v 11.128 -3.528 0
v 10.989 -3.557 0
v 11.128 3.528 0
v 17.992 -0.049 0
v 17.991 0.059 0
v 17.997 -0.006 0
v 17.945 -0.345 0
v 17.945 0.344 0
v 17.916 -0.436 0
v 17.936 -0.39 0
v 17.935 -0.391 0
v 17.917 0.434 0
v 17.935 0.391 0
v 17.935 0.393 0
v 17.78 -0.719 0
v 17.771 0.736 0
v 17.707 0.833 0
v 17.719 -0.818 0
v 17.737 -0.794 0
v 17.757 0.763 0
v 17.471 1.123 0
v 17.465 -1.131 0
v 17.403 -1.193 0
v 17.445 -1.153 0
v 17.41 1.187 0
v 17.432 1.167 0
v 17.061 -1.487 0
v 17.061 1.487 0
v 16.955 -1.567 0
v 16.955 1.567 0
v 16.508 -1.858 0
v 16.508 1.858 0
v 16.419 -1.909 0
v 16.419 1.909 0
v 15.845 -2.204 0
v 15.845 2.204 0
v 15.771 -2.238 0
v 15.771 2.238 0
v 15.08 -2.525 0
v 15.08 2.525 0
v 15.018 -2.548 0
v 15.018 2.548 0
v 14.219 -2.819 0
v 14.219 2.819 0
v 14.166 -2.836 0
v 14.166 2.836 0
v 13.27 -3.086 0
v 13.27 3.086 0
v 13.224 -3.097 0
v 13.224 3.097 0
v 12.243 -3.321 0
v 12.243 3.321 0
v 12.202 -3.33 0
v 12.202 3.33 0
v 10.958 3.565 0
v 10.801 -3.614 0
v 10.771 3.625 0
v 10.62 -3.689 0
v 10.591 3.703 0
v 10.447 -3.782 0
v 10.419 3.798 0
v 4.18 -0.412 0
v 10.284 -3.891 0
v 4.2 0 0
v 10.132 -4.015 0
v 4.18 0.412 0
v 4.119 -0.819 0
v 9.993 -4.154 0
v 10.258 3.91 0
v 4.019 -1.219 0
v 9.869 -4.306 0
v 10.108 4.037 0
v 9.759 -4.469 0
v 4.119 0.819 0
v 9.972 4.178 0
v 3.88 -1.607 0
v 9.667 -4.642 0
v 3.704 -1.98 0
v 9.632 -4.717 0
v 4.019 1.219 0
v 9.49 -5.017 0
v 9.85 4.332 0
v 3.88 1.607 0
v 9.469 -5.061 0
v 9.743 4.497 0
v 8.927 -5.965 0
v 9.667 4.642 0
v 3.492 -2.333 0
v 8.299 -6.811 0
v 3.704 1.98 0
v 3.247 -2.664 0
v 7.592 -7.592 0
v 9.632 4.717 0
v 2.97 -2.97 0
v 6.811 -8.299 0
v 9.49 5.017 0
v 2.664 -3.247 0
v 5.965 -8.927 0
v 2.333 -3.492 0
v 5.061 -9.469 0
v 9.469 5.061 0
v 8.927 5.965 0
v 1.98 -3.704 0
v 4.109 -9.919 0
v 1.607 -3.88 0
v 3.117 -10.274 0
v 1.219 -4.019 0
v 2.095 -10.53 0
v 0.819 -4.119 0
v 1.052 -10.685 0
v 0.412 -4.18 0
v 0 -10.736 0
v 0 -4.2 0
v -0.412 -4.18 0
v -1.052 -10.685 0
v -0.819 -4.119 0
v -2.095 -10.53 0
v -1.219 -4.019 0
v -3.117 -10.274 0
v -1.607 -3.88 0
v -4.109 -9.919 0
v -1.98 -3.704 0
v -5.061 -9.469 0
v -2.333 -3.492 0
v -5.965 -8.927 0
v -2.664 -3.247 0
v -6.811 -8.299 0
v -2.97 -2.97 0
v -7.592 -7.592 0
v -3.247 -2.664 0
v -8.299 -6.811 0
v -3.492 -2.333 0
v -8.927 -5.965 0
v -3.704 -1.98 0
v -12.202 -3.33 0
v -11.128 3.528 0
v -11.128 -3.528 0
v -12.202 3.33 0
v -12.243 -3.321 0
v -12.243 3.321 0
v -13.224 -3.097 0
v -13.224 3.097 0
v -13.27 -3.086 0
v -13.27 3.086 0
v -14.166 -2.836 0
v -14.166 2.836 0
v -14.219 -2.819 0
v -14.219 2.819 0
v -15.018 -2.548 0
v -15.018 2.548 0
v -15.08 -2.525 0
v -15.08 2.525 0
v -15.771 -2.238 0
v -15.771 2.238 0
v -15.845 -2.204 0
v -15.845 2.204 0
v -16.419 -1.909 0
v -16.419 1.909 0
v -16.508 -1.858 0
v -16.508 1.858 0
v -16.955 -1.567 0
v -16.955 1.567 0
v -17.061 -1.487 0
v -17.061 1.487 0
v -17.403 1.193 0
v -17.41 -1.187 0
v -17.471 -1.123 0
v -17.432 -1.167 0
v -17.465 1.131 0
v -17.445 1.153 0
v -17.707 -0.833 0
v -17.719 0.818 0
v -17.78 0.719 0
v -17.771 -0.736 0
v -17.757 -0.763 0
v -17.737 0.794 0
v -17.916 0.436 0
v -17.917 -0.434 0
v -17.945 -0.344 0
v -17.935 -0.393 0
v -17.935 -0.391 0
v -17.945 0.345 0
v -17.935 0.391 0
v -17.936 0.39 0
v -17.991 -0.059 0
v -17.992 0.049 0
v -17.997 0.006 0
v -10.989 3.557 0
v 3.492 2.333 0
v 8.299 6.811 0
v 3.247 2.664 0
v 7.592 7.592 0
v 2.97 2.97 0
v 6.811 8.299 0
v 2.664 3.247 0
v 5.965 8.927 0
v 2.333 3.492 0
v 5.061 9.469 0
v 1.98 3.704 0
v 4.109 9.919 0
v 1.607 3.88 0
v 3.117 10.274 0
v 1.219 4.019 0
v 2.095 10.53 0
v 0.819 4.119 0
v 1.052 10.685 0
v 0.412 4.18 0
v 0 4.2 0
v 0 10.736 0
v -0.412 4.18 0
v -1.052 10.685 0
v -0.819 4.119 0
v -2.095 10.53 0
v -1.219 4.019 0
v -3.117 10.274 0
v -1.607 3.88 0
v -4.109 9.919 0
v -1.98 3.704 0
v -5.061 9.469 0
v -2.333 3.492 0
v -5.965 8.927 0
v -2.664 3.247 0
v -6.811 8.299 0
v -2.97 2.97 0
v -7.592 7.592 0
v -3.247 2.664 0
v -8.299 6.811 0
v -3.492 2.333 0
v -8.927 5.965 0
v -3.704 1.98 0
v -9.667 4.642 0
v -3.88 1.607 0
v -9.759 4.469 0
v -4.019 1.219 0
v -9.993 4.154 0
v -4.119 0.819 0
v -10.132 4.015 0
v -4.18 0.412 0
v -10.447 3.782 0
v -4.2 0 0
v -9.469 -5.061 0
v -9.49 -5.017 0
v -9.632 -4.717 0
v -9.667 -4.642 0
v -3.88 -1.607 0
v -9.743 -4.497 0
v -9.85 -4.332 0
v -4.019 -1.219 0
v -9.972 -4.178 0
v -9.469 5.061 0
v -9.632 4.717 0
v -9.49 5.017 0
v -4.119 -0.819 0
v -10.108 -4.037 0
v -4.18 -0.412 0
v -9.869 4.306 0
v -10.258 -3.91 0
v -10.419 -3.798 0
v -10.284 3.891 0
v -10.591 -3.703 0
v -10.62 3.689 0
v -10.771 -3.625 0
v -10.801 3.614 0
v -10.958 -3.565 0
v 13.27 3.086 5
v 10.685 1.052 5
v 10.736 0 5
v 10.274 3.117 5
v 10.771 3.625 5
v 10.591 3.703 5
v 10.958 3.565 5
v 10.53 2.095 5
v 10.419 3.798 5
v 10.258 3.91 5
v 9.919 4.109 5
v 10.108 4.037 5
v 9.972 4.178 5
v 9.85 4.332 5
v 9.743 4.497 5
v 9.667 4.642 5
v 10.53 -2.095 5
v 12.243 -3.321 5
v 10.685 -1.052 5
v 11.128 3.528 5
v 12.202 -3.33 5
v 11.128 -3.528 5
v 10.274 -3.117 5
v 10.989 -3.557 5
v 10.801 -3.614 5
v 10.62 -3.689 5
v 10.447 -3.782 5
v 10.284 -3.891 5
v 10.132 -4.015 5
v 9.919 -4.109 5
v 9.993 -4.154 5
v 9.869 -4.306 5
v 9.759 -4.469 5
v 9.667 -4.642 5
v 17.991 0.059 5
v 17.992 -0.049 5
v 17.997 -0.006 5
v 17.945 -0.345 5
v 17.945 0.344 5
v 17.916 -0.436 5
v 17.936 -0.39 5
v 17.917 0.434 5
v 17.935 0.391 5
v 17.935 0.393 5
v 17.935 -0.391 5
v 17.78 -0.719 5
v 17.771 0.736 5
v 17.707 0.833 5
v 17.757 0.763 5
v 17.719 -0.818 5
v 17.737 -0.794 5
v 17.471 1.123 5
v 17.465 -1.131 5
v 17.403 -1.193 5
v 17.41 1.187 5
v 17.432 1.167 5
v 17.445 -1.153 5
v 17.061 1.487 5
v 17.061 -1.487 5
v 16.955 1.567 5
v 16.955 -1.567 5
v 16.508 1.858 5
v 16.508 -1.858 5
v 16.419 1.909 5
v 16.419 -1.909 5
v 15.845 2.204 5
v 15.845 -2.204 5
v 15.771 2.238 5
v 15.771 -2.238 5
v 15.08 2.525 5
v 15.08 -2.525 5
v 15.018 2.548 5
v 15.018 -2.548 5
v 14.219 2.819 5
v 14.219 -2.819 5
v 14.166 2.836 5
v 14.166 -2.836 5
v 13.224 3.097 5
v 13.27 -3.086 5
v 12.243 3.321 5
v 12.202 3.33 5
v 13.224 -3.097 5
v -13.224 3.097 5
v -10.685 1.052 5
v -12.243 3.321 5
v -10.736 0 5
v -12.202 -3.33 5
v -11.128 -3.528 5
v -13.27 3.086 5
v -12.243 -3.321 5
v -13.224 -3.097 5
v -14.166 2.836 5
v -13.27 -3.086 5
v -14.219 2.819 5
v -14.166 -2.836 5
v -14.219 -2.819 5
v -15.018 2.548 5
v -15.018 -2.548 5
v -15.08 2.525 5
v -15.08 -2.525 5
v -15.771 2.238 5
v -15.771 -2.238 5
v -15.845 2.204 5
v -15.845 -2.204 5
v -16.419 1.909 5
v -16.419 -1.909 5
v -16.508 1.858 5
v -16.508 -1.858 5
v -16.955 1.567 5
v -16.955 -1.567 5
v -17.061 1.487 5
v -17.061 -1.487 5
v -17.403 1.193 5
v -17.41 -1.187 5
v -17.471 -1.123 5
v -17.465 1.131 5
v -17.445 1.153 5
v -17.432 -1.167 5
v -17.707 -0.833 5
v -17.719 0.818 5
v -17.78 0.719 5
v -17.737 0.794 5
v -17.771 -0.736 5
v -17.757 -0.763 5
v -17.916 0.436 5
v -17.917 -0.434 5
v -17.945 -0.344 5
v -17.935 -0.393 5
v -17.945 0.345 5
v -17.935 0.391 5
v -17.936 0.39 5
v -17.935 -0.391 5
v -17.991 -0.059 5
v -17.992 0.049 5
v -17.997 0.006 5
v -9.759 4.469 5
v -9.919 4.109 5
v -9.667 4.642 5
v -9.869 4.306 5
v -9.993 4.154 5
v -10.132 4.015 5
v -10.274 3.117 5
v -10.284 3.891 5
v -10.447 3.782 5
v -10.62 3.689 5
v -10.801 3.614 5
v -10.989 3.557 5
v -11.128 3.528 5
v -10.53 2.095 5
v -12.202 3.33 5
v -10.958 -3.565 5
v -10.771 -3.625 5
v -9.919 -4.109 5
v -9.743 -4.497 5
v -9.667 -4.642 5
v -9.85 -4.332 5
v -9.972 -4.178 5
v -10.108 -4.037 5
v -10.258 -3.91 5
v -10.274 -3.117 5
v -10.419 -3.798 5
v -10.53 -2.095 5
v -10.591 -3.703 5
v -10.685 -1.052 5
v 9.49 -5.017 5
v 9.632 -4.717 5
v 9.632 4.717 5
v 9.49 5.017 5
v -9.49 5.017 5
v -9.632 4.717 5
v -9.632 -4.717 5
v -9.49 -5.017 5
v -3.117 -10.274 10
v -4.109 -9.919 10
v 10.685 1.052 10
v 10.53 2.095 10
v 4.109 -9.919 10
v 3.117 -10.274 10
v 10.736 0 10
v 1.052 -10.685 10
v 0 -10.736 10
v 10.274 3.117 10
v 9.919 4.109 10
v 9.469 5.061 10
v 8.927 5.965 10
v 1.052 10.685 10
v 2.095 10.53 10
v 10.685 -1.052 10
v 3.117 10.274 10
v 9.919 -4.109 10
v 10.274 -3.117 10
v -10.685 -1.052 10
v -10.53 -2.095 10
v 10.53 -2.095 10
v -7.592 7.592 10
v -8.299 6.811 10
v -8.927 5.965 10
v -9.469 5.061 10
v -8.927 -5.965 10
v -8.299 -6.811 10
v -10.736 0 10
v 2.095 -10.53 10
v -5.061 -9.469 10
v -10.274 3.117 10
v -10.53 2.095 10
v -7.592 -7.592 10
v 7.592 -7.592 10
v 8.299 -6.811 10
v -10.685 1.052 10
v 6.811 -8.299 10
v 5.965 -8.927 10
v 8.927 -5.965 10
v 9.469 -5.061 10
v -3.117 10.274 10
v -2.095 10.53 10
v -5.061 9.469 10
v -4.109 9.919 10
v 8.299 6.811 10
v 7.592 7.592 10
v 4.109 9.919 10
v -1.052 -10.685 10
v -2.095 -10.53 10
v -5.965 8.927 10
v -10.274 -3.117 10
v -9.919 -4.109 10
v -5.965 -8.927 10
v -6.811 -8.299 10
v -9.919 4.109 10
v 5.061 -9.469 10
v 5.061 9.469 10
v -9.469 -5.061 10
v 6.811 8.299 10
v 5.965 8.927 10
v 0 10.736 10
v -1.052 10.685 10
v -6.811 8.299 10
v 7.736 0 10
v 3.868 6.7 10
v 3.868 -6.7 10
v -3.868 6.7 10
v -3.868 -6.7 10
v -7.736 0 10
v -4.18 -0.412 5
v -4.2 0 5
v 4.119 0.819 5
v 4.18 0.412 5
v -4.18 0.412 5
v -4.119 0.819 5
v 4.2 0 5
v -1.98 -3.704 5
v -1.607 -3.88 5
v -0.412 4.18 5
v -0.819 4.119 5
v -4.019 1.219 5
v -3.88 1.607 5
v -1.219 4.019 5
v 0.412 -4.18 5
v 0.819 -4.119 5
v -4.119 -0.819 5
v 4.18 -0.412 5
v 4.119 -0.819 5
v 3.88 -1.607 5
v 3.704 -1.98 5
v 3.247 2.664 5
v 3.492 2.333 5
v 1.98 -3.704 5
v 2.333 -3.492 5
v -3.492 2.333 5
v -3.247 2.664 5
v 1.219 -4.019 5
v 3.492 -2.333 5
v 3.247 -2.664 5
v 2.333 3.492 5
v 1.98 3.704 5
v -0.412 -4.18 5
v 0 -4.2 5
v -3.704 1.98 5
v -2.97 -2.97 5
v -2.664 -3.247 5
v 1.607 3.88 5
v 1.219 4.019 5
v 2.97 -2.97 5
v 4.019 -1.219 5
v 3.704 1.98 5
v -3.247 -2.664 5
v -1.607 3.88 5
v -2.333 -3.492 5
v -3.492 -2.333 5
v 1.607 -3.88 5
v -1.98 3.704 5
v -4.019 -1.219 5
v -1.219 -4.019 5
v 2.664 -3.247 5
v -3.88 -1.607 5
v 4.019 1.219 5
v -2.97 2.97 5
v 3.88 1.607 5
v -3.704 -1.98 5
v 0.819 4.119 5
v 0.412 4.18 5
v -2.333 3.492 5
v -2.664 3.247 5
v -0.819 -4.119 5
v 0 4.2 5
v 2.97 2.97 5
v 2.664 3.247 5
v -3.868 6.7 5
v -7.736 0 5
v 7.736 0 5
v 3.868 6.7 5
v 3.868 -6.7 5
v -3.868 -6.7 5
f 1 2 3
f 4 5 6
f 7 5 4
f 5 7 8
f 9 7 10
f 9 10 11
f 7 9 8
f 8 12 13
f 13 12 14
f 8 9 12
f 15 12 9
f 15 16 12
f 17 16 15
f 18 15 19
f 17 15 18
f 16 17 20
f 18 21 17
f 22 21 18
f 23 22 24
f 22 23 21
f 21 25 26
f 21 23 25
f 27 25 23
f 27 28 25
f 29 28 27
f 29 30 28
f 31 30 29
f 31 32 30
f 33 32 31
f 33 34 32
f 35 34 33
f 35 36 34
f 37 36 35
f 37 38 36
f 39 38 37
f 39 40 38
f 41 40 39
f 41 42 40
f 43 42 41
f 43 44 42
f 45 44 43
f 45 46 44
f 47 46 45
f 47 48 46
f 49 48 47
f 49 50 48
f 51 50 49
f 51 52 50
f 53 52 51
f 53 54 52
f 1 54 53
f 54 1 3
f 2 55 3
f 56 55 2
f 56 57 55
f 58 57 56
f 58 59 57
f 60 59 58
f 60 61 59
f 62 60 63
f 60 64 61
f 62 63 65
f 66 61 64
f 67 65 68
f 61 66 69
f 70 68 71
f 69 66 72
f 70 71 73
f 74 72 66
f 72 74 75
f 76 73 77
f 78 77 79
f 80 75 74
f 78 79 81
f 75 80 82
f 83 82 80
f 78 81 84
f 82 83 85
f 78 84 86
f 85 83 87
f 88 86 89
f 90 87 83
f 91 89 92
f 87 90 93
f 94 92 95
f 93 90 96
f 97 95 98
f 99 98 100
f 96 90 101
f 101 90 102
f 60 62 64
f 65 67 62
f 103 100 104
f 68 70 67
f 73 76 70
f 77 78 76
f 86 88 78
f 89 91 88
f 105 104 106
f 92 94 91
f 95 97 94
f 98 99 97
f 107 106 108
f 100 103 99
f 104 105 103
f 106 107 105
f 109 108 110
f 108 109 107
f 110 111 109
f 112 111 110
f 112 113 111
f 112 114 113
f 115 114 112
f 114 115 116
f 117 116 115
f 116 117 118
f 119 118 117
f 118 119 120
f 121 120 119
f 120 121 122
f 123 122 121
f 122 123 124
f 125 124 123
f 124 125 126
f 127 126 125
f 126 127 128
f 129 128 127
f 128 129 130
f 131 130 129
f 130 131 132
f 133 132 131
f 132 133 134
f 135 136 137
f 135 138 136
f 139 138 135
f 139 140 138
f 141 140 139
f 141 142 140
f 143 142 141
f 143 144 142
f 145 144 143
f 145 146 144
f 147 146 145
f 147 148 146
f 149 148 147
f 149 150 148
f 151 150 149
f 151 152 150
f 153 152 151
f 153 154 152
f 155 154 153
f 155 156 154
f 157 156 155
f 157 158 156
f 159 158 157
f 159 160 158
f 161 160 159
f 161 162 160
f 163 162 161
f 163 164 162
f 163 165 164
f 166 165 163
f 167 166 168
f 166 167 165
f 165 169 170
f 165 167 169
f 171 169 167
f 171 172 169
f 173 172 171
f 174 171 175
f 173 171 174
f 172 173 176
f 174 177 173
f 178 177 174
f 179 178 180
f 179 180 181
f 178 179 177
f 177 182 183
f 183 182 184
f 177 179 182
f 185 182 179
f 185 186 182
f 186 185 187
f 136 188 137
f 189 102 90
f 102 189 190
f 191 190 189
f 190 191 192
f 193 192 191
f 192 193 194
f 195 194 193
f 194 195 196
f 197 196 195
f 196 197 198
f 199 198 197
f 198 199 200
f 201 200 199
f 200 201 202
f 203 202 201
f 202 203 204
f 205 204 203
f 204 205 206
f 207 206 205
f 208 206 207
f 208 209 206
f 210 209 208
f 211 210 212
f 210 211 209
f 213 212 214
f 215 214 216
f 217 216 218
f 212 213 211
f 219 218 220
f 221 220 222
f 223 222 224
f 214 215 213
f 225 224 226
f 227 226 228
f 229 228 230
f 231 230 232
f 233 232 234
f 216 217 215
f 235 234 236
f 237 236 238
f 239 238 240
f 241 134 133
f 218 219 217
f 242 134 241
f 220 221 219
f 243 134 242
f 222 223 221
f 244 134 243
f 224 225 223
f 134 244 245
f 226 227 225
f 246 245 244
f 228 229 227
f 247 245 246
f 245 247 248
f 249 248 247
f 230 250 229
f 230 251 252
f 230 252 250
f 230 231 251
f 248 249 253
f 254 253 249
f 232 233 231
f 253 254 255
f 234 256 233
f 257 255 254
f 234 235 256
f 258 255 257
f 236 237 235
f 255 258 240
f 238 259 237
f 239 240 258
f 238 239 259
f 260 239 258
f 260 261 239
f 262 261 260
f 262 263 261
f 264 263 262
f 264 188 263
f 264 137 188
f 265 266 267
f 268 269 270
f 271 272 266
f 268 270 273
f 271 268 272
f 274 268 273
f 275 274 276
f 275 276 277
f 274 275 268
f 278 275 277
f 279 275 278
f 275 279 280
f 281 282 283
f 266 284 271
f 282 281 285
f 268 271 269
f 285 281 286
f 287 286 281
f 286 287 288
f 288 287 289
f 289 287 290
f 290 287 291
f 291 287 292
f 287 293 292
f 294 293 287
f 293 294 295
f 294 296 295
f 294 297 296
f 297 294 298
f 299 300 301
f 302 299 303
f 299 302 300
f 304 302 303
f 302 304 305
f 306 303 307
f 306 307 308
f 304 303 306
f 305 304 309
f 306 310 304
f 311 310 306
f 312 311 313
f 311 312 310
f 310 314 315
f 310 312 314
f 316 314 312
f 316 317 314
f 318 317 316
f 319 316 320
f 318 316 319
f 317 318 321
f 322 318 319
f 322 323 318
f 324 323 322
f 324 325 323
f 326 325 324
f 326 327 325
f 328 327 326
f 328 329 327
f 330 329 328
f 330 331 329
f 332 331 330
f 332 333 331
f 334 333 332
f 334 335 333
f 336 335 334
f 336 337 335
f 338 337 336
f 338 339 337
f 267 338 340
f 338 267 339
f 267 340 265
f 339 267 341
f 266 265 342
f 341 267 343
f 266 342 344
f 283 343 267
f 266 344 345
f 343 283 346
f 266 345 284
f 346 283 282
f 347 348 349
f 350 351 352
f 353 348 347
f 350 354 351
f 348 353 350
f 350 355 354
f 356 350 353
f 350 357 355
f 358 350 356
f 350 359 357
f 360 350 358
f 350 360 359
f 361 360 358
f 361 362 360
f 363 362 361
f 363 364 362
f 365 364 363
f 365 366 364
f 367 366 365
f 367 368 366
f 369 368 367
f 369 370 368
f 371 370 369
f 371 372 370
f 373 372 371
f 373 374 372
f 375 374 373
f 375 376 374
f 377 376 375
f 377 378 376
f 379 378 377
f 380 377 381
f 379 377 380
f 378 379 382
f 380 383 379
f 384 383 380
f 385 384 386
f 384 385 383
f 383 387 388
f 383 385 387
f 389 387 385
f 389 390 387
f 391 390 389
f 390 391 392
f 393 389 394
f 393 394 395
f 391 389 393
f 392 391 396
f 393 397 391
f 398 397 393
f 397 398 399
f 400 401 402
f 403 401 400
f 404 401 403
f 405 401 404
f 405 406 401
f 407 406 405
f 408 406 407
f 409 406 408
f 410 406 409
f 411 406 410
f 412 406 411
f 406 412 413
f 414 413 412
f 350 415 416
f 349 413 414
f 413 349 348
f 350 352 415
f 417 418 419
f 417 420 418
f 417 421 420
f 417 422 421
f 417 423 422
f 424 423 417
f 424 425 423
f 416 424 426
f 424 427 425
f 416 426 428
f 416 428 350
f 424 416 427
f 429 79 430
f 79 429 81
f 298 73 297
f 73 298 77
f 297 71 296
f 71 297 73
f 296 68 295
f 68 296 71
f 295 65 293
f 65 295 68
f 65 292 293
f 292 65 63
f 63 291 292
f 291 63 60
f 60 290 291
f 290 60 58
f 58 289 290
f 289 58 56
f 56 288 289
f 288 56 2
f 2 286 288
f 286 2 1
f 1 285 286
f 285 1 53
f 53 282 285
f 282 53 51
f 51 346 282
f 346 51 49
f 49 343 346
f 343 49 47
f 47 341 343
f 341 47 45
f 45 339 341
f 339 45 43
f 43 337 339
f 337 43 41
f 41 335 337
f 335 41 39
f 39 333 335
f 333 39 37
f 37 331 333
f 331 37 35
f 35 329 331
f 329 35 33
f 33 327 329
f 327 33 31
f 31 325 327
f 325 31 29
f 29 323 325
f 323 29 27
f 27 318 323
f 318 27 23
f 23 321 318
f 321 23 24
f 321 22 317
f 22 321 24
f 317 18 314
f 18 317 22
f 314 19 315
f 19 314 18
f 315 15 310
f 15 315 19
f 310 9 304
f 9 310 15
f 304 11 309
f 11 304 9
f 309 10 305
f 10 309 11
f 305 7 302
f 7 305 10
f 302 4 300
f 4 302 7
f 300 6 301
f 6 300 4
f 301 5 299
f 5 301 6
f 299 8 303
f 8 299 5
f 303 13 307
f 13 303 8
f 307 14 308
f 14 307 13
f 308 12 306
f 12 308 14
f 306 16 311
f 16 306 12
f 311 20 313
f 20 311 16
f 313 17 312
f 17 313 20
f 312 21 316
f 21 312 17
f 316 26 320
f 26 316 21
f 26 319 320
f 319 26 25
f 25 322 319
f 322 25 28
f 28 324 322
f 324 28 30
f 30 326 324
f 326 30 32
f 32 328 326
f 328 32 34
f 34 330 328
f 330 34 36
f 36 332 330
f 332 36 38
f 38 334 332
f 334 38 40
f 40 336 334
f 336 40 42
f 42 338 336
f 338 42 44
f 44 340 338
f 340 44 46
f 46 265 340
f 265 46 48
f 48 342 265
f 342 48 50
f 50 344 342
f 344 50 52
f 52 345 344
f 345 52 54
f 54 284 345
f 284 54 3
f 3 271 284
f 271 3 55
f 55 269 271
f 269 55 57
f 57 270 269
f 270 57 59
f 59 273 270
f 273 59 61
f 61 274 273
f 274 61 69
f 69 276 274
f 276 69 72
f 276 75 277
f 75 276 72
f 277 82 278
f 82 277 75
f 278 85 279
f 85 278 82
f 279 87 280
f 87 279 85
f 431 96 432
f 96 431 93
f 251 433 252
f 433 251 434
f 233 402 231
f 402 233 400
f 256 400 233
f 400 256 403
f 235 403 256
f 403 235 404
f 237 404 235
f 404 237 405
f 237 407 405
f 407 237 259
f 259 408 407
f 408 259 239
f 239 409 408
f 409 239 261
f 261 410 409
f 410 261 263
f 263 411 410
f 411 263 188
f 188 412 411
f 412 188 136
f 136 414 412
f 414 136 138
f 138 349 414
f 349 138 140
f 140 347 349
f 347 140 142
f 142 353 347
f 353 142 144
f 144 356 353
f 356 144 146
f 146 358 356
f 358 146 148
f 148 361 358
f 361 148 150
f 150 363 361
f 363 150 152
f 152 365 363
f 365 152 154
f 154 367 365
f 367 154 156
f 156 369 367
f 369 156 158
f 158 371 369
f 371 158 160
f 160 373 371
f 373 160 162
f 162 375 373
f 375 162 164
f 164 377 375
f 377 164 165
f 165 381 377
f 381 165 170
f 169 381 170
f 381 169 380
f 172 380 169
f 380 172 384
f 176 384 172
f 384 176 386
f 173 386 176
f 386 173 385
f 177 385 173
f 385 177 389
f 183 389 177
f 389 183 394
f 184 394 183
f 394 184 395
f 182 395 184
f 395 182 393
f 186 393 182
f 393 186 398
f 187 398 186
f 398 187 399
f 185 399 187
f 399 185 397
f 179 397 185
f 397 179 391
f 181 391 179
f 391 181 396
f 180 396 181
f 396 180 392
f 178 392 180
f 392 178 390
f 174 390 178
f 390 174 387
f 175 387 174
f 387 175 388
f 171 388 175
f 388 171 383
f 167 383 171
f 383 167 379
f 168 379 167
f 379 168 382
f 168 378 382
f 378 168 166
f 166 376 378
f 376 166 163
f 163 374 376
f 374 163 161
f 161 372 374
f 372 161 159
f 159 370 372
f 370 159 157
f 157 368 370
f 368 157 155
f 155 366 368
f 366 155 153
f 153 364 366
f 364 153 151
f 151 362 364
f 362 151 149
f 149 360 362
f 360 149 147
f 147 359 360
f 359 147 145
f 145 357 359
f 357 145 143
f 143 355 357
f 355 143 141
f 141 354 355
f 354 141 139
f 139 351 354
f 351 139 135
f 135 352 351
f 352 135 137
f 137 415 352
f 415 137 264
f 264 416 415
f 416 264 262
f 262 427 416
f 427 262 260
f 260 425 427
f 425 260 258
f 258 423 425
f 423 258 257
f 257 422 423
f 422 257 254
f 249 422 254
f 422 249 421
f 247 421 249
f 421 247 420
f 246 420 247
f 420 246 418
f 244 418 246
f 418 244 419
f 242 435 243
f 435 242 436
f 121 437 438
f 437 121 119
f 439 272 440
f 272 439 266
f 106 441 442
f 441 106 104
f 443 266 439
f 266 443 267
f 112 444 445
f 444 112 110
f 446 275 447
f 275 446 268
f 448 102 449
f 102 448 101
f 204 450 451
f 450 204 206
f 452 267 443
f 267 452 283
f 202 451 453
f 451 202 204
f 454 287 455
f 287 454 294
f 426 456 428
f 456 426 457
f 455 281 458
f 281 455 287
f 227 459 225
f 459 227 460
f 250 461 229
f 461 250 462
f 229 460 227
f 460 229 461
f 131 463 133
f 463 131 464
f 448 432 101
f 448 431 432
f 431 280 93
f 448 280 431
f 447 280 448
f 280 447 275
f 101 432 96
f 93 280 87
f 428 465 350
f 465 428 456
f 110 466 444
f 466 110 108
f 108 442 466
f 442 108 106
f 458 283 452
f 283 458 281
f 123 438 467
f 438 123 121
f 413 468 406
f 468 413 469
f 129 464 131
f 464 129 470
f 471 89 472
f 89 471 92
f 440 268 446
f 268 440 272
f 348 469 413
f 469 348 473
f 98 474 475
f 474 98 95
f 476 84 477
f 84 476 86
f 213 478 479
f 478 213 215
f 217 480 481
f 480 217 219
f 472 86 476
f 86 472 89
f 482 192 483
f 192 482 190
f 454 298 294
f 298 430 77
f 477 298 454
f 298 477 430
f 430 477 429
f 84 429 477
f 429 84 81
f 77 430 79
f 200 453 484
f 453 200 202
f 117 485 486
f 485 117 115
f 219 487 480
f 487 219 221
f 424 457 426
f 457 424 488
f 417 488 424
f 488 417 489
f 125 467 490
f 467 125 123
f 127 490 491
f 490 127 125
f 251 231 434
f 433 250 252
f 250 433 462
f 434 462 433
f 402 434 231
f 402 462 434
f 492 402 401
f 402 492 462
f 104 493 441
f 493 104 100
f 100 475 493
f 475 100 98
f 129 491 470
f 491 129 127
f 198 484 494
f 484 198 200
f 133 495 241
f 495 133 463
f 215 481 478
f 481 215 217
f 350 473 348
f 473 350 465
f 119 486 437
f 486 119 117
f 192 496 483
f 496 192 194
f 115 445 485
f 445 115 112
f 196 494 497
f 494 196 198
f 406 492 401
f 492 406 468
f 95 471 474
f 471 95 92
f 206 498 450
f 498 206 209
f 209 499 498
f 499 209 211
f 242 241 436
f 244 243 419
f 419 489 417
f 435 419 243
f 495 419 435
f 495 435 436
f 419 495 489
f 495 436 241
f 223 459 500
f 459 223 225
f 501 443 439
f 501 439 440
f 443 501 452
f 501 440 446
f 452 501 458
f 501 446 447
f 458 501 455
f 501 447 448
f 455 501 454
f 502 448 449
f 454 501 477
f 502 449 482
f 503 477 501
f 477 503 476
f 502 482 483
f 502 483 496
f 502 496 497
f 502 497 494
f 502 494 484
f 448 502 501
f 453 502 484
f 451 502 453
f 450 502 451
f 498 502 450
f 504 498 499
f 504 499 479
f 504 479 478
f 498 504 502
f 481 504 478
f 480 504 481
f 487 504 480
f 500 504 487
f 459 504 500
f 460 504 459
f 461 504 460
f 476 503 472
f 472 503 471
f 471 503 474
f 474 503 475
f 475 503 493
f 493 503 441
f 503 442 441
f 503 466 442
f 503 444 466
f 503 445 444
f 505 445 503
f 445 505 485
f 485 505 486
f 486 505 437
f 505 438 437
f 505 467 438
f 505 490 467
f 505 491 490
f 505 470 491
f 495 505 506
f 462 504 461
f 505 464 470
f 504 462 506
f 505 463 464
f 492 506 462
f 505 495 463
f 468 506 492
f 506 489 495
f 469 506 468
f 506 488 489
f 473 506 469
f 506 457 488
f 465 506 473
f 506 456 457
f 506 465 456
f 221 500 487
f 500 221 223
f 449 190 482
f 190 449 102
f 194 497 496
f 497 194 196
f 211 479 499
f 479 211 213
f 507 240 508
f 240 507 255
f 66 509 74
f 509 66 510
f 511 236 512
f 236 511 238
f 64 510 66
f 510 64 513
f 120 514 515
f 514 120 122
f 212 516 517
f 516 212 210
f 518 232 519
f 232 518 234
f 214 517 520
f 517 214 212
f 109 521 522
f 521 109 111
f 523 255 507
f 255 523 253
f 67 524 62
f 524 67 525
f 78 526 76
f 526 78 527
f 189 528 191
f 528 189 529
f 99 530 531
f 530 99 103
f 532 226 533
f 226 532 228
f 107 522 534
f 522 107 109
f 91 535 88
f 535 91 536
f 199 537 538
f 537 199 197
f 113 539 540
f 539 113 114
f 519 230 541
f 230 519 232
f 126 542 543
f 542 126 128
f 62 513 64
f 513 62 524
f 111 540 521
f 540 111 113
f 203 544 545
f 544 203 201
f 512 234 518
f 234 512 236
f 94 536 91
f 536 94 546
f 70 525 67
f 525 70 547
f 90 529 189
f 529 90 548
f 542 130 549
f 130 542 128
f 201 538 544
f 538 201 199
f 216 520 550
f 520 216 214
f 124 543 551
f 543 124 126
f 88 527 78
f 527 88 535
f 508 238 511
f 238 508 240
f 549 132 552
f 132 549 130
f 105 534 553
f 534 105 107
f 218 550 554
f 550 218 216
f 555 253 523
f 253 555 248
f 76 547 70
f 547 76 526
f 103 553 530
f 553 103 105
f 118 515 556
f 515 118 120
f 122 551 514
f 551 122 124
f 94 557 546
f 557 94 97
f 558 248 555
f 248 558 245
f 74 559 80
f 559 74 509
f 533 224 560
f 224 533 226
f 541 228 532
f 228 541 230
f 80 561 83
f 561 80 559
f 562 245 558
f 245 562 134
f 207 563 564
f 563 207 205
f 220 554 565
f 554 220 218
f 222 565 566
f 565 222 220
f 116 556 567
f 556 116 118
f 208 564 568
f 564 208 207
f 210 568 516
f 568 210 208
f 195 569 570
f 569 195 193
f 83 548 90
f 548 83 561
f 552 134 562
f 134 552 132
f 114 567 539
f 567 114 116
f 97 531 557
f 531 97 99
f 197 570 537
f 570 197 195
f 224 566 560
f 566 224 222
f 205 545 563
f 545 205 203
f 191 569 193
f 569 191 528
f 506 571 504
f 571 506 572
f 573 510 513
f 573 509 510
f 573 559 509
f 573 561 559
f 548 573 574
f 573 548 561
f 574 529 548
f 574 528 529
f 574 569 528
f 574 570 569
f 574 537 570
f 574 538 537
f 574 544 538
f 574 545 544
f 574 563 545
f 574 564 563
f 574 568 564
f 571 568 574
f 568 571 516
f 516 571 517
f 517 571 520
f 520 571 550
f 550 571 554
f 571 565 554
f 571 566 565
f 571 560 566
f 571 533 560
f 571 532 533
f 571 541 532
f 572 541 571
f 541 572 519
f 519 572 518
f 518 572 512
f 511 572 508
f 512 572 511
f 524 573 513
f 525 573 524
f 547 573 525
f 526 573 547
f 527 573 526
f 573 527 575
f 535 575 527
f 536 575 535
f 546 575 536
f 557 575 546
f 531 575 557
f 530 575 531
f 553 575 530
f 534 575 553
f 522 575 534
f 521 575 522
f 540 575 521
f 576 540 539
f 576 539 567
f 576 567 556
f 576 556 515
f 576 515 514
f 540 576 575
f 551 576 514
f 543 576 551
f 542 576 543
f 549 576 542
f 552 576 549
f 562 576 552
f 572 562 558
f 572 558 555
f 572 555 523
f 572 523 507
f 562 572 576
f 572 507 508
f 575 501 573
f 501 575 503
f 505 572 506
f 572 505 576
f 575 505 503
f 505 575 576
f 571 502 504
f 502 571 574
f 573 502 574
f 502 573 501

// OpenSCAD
// file: ../../modules/bolts.scad
module nut_trap(d, h, center = true) {
  linear_extrude(height = h, center = center)
  circle(d = d / cos(30), $fn = 6);
}

module bolt_hole(d, h, center = true) {
  linear_extrude(height = h, center = center)
  circle(d = d, $fn = 64);
}

// Hex holes for self-tapping (nominal - 0.2mm)
module hex_hole(flat_d, h) {
  linear_extrude(height = h, center = true)
  circle(d = flat_d / cos(30), $fn = 6);
}

module m3_bolt_hexhole(h) {
  rotate([0, 0, 90]) hex_hole(flat_d = 2.8, h = h);
}

module m4_bolt_hexhole(h) {
  rotate([0, 0, 90]) hex_hole(flat_d = 3.8, h = h);
}

module m6_bolt_hexhole(h) {
  rotate([0, 0, 90]) hex_hole(flat_d = 5.8, h = h);
}

module m8_bolt_hexhole(h) {
  rotate([0, 0, 90]) hex_hole(flat_d = 7.8, h = h);
}

// M3
module m3_bolt_hole(h, center = false) { bolt_hole(d = 3.4, h = h, center = center); }
module m3_nut_trap(h, center = false) { nut_trap(d = 5.7, h = h, center = center); }

// M4
module m4_bolt_hole(h, center = false) { bolt_hole(d = 4.4, h = h, center = center); }
module m4_nut_trap(h, center = false) { nut_trap(d = 7.5, h = h, center = center); }

// M6
module m6_bolt_hole(h, center = false) { bolt_hole(d = 6.2, h = h, center = center); }
module m6_nut_trap(h, center = false) { nut_trap(d = 10.2, h = h, center = center); }

// M8
module m8_bolt_hole(h, center = false) { bolt_hole(d = 8.4, h = h, center = center); }
module m8_nut_trap(h, center = false) { nut_trap(d = 13.3, h = h, center = center); }
// main file
use <../../modules/bolts.scad>

// 簡易クランプ (コの字のステンレス板・「外六角20mm」) に1本だけ刺さっている
// M8 ボルトを、工具無しの手回し式へ換装するノブ。
// 設計の経緯と確定値は ledger/designs/clamp-hand-knob.md が正本。
//
// クランプは机を挟むコの字で、ボルトの先端には M4 のメスが切ってあり、
// ラッパ状の当て板が M4 ネジ1本で留まっている。当て板を外すとボルトが
// 抜けるので、ボルトのネジ側からこのノブを通し、先端の六角へ噛ませる。
//
// 座標系 (部品自身の datum):
//   X = レバーの長手方向。全長 knob_len (36) の中心が原点
//   Y = レバーの短手方向
//   Z = 0 が部品底面 (プリント面)。穴の軸は Z で、+Z がボルト先端の側
//
// 段構成 (下から):
//   Z 0..pass_h  レバー本体。M8 の軸 (7.8Φ) が通る Φ8.4 の丸穴
//   Z pass_h..   中央ハブだけのボス。ボルト先端の六角を受けるポケット
// 穴が下で細く上で太いので、ボルト先端の六角の肩 (軸から六角へ太る段) が
// この段差へ座り、ノブが六角の上で止まる。
//
// 印刷向き: 底面 (z=0) をビルドプレートへ置く。外周は楕円と円とその接合の
// フィレット弧、穴は円と六角で、すべて垂直面 + 水平な上下面しかない
// (フィレットは平面輪郭に入るので、掛かるのは Z に沿った縦の面である)。
// 穴は上へ向かって太るだけ
// なので水平ブリッジ (天井) が1枚も無く、サポートも要らない。

// --- クランプ本体の実測値 (user のノギス実測) ---
clamp_plate_t = 3.8;     // コの字ステンレス板の厚さ
clamp_plate_h = 28.4;    // 机を挟んだときのコの字の内高
clamp_plate_w = 24.0;    // 同・横幅
clamp_thread_d = 7.8;    // ボルト穴の実測径 (M8 相当)
tip_hex_measured = 12.8; // ボルト先端の六角 二面幅の実測

// --- ノブの設計値 ---
// 嵌合クリアランス。ボルト先端の六角は「入れやすさ考慮で 13.4」という
// user 指定で、通し穴も同じ 0.6 を足して 8.4 になる (このリポジトリの
// M8 通し穴 8.4 とも一致する)
clearance = 0.6;
knob_len = 36;    // ハンドルの全長 (X)。user 指定
lobe = [ 26, 8 ]; // 楕円ローブ1枚の [長径, 短径]。「2本の瞳みたいな楕円形」。
                  // 短径は「楕円が丸すぎて力が入りづらい」という user の指摘で
                  // 16 から半分にした (長径と全長は不変)
junction_r = 2; // ハブとローブの凹接合へ入れるフィレット半径。user 指定
hub_wall = 3;   // 六角ポケットの周りに残す肉厚
pass_h = 5;     // 下段 (M8 通し穴) の高さ。user 指定
hex_h = 5;      // 上段 (六角ポケット) の高さ。user 指定
arc_fn = 64;    // 円弧の分割数 (このリポジトリの既存慣行)
cut_over = 0.5; // 切削の抜き代 (面同士の接触で退化した稜を残さないため)

// --- 派生値 ---
m8_pass_d = clamp_thread_d + clearance;      // 8.4
tip_hex_flat = tip_hex_measured + clearance; // 13.4
// flat 指定の六角は対角 = 二面幅/cos30 (modules/bolts.scad と同じ流儀)
tip_hex_diag = tip_hex_flat / cos(30);
// ハブは六角ポケットを hub_wall で包む円。ここから直に決めるので、
// 六角を太らせれば必要なぶんだけハブも太る
hub_d = tip_hex_diag + 2 * hub_wall;
// ローブ中心の X オフセット。全長を knob_len ちょうどにする位置に置く
lobe_offset = knob_len / 2 - lobe[0] / 2;

// 楕円の2D輪郭 (長径 w・短径 d)
module
ellipse_2d(w, d)
{
    scale([ w / 2, d / 2 ]) circle(r = 1, $fn = arc_fn);
}

// レバーの素の輪郭: 楕円ローブ2枚 ∪ 中央ハブ円。ローブの中心はハブの中に
// あるので、3つの図形は必ず1つに融合する (ボスが浮いた島にならない)。
// ハブとローブは凹角で交わり、その角を丸めるのは knob_footprint_2d である
module
knob_outline_2d()
{
    union()
    {
        for (s = [ -1, 1 ])
            translate([ s * lobe_offset, 0 ]) ellipse_2d(lobe[0], lobe[1]);
        circle(d = hub_d, $fn = arc_fn);
    }
}

// レバーの平面輪郭。素の輪郭へ closing (offset +junction_r → -junction_r) を
// 掛け、ハブとローブが交わる凹角4箇所へ R2 のフィレットを入れる。closing は
// 「外側から半径 junction_r の円が入り込めない窪み」だけを埋める操作なので、
// 凸の境界 (ローブ先端・ハブの外周) は1点も動かない。つまり全長 knob_len も
// ハブ径 hub_d も不変で、増えるのは凹接合のくさびの肉だけである
module
knob_footprint_2d()
{
    offset(r = -junction_r, $fn = arc_fn) offset(r = junction_r, $fn = arc_fn)
        knob_outline_2d();
}

module
hand_knob_body()
{
    difference()
    {
        union()
        {
            linear_extrude(height = pass_h) knob_footprint_2d();
            // 上段のボスはハブ円だけを伸ばす。ローブは下段で終わり、
            // 指が掛かるレバーの厚みは pass_h のまま
            linear_extrude(height = pass_h + hex_h)
                circle(d = hub_d, $fn = arc_fn);
        }

        // M8 の軸が下から通る丸穴。上端は六角ポケットへ cut_over だけ
        // 食い込ませる (段の位置は六角ポケットの下端 = pass_h が決める)
        translate([ 0, 0, -cut_over ])
            bolt_hole(d = m8_pass_d, h = pass_h + 2 * cut_over, center = false);

        // ボルト先端の六角を受けるポケット (上開き)。nut_trap は二面幅で
        // 指定する汎用の六角ポケットで、ここに入るのはナットではなく
        // ボルト先端の六角である
        translate([ 0, 0, pass_h ])
            nut_trap(d = tip_hex_flat, h = hex_h + cut_over, center = false);
    }
}

module
hand_knob()
{
    // クランプ本体の実測値 (この部品の前提)
    echo(str("CONTRACT hand_knob: clamp_plate = ",
             [ clamp_plate_t, clamp_plate_h, clamp_plate_w ]));
    echo(str("CONTRACT hand_knob: clamp_thread_d = ", clamp_thread_d));
    echo(str("CONTRACT hand_knob: tip_hex_measured = ", tip_hex_measured));
    echo(str("CONTRACT hand_knob: clearance = ", clearance));
    // ノブの確定寸法
    echo(str("CONTRACT hand_knob: knob_len = ", knob_len));
    echo(str("CONTRACT hand_knob: lobe = ", lobe));
    echo(str("CONTRACT hand_knob: lobe_offset = ", lobe_offset));
    echo(str("CONTRACT hand_knob: junction_r = ", junction_r));
    echo(str("CONTRACT hand_knob: m8_pass_d = ", m8_pass_d));
    echo(str("CONTRACT hand_knob: tip_hex_flat = ", tip_hex_flat));
    echo(str("CONTRACT hand_knob: tip_hex_diag = ", tip_hex_diag));
    echo(str("CONTRACT hand_knob: hub_wall = ", hub_wall));
    echo(str("CONTRACT hand_knob: hub_d = ", hub_d));
    echo(str("CONTRACT hand_knob: heights = ", [ pass_h, hex_h ]));

    // 六角ポケットの周りに hub_wall が残ること。hub_d の導出を書き換えても
    // (実測値で上書きしても) 肉厚がここで守られる
    assert(tip_hex_diag + 2 * hub_wall <= hub_d + 1e-9,
           "the hub is too thin around the hex pocket");
    // 段が残ること: 下段の穴が六角より小さくないと、ボルト先端の六角の肩が
    // 座る面が消えてノブが軸を突き抜ける
    assert(m8_pass_d < tip_hex_flat,
           "the pass hole must be smaller than the hex pocket");
    // 全長は user 指定の 36 ちょうど (ローブの位置で合わせる)
    assert(abs(2 * (lobe_offset + lobe[0] / 2) - knob_len) < 1e-9,
           "the lobes do not add up to knob_len");
    // ローブが2枚に分かれて見えること (長径が全長に達すると1枚の塊になる)
    assert(lobe_offset > 0, "the lobes merge into a single blob");
    // 各ローブがハブの中心を覆うこと。覆わないとハブとローブが離れ、
    // 上段のボスが本体から浮いた島になる
    assert(
        lobe_offset < lobe[0] / 2,
        "the lobes do not reach the hub center; the boss would be an island");
    // ハブがローブを飲み込まないこと (飲み込むと指を掛ける腕が消える)
    assert(hub_d < knob_len, "the hub swallows the lobes");
    // 部品の Y 幅はハブが決めること。ローブの短径がハブ径を越えると外形の
    // Y がローブ側へ移り、台帳と断面検査の前提 (Y 幅 = hub_d) が崩れる
    assert(lobe[1] < hub_d, "the lobes are wider than the hub");

    hand_knob_body();
}

hand_knob();
